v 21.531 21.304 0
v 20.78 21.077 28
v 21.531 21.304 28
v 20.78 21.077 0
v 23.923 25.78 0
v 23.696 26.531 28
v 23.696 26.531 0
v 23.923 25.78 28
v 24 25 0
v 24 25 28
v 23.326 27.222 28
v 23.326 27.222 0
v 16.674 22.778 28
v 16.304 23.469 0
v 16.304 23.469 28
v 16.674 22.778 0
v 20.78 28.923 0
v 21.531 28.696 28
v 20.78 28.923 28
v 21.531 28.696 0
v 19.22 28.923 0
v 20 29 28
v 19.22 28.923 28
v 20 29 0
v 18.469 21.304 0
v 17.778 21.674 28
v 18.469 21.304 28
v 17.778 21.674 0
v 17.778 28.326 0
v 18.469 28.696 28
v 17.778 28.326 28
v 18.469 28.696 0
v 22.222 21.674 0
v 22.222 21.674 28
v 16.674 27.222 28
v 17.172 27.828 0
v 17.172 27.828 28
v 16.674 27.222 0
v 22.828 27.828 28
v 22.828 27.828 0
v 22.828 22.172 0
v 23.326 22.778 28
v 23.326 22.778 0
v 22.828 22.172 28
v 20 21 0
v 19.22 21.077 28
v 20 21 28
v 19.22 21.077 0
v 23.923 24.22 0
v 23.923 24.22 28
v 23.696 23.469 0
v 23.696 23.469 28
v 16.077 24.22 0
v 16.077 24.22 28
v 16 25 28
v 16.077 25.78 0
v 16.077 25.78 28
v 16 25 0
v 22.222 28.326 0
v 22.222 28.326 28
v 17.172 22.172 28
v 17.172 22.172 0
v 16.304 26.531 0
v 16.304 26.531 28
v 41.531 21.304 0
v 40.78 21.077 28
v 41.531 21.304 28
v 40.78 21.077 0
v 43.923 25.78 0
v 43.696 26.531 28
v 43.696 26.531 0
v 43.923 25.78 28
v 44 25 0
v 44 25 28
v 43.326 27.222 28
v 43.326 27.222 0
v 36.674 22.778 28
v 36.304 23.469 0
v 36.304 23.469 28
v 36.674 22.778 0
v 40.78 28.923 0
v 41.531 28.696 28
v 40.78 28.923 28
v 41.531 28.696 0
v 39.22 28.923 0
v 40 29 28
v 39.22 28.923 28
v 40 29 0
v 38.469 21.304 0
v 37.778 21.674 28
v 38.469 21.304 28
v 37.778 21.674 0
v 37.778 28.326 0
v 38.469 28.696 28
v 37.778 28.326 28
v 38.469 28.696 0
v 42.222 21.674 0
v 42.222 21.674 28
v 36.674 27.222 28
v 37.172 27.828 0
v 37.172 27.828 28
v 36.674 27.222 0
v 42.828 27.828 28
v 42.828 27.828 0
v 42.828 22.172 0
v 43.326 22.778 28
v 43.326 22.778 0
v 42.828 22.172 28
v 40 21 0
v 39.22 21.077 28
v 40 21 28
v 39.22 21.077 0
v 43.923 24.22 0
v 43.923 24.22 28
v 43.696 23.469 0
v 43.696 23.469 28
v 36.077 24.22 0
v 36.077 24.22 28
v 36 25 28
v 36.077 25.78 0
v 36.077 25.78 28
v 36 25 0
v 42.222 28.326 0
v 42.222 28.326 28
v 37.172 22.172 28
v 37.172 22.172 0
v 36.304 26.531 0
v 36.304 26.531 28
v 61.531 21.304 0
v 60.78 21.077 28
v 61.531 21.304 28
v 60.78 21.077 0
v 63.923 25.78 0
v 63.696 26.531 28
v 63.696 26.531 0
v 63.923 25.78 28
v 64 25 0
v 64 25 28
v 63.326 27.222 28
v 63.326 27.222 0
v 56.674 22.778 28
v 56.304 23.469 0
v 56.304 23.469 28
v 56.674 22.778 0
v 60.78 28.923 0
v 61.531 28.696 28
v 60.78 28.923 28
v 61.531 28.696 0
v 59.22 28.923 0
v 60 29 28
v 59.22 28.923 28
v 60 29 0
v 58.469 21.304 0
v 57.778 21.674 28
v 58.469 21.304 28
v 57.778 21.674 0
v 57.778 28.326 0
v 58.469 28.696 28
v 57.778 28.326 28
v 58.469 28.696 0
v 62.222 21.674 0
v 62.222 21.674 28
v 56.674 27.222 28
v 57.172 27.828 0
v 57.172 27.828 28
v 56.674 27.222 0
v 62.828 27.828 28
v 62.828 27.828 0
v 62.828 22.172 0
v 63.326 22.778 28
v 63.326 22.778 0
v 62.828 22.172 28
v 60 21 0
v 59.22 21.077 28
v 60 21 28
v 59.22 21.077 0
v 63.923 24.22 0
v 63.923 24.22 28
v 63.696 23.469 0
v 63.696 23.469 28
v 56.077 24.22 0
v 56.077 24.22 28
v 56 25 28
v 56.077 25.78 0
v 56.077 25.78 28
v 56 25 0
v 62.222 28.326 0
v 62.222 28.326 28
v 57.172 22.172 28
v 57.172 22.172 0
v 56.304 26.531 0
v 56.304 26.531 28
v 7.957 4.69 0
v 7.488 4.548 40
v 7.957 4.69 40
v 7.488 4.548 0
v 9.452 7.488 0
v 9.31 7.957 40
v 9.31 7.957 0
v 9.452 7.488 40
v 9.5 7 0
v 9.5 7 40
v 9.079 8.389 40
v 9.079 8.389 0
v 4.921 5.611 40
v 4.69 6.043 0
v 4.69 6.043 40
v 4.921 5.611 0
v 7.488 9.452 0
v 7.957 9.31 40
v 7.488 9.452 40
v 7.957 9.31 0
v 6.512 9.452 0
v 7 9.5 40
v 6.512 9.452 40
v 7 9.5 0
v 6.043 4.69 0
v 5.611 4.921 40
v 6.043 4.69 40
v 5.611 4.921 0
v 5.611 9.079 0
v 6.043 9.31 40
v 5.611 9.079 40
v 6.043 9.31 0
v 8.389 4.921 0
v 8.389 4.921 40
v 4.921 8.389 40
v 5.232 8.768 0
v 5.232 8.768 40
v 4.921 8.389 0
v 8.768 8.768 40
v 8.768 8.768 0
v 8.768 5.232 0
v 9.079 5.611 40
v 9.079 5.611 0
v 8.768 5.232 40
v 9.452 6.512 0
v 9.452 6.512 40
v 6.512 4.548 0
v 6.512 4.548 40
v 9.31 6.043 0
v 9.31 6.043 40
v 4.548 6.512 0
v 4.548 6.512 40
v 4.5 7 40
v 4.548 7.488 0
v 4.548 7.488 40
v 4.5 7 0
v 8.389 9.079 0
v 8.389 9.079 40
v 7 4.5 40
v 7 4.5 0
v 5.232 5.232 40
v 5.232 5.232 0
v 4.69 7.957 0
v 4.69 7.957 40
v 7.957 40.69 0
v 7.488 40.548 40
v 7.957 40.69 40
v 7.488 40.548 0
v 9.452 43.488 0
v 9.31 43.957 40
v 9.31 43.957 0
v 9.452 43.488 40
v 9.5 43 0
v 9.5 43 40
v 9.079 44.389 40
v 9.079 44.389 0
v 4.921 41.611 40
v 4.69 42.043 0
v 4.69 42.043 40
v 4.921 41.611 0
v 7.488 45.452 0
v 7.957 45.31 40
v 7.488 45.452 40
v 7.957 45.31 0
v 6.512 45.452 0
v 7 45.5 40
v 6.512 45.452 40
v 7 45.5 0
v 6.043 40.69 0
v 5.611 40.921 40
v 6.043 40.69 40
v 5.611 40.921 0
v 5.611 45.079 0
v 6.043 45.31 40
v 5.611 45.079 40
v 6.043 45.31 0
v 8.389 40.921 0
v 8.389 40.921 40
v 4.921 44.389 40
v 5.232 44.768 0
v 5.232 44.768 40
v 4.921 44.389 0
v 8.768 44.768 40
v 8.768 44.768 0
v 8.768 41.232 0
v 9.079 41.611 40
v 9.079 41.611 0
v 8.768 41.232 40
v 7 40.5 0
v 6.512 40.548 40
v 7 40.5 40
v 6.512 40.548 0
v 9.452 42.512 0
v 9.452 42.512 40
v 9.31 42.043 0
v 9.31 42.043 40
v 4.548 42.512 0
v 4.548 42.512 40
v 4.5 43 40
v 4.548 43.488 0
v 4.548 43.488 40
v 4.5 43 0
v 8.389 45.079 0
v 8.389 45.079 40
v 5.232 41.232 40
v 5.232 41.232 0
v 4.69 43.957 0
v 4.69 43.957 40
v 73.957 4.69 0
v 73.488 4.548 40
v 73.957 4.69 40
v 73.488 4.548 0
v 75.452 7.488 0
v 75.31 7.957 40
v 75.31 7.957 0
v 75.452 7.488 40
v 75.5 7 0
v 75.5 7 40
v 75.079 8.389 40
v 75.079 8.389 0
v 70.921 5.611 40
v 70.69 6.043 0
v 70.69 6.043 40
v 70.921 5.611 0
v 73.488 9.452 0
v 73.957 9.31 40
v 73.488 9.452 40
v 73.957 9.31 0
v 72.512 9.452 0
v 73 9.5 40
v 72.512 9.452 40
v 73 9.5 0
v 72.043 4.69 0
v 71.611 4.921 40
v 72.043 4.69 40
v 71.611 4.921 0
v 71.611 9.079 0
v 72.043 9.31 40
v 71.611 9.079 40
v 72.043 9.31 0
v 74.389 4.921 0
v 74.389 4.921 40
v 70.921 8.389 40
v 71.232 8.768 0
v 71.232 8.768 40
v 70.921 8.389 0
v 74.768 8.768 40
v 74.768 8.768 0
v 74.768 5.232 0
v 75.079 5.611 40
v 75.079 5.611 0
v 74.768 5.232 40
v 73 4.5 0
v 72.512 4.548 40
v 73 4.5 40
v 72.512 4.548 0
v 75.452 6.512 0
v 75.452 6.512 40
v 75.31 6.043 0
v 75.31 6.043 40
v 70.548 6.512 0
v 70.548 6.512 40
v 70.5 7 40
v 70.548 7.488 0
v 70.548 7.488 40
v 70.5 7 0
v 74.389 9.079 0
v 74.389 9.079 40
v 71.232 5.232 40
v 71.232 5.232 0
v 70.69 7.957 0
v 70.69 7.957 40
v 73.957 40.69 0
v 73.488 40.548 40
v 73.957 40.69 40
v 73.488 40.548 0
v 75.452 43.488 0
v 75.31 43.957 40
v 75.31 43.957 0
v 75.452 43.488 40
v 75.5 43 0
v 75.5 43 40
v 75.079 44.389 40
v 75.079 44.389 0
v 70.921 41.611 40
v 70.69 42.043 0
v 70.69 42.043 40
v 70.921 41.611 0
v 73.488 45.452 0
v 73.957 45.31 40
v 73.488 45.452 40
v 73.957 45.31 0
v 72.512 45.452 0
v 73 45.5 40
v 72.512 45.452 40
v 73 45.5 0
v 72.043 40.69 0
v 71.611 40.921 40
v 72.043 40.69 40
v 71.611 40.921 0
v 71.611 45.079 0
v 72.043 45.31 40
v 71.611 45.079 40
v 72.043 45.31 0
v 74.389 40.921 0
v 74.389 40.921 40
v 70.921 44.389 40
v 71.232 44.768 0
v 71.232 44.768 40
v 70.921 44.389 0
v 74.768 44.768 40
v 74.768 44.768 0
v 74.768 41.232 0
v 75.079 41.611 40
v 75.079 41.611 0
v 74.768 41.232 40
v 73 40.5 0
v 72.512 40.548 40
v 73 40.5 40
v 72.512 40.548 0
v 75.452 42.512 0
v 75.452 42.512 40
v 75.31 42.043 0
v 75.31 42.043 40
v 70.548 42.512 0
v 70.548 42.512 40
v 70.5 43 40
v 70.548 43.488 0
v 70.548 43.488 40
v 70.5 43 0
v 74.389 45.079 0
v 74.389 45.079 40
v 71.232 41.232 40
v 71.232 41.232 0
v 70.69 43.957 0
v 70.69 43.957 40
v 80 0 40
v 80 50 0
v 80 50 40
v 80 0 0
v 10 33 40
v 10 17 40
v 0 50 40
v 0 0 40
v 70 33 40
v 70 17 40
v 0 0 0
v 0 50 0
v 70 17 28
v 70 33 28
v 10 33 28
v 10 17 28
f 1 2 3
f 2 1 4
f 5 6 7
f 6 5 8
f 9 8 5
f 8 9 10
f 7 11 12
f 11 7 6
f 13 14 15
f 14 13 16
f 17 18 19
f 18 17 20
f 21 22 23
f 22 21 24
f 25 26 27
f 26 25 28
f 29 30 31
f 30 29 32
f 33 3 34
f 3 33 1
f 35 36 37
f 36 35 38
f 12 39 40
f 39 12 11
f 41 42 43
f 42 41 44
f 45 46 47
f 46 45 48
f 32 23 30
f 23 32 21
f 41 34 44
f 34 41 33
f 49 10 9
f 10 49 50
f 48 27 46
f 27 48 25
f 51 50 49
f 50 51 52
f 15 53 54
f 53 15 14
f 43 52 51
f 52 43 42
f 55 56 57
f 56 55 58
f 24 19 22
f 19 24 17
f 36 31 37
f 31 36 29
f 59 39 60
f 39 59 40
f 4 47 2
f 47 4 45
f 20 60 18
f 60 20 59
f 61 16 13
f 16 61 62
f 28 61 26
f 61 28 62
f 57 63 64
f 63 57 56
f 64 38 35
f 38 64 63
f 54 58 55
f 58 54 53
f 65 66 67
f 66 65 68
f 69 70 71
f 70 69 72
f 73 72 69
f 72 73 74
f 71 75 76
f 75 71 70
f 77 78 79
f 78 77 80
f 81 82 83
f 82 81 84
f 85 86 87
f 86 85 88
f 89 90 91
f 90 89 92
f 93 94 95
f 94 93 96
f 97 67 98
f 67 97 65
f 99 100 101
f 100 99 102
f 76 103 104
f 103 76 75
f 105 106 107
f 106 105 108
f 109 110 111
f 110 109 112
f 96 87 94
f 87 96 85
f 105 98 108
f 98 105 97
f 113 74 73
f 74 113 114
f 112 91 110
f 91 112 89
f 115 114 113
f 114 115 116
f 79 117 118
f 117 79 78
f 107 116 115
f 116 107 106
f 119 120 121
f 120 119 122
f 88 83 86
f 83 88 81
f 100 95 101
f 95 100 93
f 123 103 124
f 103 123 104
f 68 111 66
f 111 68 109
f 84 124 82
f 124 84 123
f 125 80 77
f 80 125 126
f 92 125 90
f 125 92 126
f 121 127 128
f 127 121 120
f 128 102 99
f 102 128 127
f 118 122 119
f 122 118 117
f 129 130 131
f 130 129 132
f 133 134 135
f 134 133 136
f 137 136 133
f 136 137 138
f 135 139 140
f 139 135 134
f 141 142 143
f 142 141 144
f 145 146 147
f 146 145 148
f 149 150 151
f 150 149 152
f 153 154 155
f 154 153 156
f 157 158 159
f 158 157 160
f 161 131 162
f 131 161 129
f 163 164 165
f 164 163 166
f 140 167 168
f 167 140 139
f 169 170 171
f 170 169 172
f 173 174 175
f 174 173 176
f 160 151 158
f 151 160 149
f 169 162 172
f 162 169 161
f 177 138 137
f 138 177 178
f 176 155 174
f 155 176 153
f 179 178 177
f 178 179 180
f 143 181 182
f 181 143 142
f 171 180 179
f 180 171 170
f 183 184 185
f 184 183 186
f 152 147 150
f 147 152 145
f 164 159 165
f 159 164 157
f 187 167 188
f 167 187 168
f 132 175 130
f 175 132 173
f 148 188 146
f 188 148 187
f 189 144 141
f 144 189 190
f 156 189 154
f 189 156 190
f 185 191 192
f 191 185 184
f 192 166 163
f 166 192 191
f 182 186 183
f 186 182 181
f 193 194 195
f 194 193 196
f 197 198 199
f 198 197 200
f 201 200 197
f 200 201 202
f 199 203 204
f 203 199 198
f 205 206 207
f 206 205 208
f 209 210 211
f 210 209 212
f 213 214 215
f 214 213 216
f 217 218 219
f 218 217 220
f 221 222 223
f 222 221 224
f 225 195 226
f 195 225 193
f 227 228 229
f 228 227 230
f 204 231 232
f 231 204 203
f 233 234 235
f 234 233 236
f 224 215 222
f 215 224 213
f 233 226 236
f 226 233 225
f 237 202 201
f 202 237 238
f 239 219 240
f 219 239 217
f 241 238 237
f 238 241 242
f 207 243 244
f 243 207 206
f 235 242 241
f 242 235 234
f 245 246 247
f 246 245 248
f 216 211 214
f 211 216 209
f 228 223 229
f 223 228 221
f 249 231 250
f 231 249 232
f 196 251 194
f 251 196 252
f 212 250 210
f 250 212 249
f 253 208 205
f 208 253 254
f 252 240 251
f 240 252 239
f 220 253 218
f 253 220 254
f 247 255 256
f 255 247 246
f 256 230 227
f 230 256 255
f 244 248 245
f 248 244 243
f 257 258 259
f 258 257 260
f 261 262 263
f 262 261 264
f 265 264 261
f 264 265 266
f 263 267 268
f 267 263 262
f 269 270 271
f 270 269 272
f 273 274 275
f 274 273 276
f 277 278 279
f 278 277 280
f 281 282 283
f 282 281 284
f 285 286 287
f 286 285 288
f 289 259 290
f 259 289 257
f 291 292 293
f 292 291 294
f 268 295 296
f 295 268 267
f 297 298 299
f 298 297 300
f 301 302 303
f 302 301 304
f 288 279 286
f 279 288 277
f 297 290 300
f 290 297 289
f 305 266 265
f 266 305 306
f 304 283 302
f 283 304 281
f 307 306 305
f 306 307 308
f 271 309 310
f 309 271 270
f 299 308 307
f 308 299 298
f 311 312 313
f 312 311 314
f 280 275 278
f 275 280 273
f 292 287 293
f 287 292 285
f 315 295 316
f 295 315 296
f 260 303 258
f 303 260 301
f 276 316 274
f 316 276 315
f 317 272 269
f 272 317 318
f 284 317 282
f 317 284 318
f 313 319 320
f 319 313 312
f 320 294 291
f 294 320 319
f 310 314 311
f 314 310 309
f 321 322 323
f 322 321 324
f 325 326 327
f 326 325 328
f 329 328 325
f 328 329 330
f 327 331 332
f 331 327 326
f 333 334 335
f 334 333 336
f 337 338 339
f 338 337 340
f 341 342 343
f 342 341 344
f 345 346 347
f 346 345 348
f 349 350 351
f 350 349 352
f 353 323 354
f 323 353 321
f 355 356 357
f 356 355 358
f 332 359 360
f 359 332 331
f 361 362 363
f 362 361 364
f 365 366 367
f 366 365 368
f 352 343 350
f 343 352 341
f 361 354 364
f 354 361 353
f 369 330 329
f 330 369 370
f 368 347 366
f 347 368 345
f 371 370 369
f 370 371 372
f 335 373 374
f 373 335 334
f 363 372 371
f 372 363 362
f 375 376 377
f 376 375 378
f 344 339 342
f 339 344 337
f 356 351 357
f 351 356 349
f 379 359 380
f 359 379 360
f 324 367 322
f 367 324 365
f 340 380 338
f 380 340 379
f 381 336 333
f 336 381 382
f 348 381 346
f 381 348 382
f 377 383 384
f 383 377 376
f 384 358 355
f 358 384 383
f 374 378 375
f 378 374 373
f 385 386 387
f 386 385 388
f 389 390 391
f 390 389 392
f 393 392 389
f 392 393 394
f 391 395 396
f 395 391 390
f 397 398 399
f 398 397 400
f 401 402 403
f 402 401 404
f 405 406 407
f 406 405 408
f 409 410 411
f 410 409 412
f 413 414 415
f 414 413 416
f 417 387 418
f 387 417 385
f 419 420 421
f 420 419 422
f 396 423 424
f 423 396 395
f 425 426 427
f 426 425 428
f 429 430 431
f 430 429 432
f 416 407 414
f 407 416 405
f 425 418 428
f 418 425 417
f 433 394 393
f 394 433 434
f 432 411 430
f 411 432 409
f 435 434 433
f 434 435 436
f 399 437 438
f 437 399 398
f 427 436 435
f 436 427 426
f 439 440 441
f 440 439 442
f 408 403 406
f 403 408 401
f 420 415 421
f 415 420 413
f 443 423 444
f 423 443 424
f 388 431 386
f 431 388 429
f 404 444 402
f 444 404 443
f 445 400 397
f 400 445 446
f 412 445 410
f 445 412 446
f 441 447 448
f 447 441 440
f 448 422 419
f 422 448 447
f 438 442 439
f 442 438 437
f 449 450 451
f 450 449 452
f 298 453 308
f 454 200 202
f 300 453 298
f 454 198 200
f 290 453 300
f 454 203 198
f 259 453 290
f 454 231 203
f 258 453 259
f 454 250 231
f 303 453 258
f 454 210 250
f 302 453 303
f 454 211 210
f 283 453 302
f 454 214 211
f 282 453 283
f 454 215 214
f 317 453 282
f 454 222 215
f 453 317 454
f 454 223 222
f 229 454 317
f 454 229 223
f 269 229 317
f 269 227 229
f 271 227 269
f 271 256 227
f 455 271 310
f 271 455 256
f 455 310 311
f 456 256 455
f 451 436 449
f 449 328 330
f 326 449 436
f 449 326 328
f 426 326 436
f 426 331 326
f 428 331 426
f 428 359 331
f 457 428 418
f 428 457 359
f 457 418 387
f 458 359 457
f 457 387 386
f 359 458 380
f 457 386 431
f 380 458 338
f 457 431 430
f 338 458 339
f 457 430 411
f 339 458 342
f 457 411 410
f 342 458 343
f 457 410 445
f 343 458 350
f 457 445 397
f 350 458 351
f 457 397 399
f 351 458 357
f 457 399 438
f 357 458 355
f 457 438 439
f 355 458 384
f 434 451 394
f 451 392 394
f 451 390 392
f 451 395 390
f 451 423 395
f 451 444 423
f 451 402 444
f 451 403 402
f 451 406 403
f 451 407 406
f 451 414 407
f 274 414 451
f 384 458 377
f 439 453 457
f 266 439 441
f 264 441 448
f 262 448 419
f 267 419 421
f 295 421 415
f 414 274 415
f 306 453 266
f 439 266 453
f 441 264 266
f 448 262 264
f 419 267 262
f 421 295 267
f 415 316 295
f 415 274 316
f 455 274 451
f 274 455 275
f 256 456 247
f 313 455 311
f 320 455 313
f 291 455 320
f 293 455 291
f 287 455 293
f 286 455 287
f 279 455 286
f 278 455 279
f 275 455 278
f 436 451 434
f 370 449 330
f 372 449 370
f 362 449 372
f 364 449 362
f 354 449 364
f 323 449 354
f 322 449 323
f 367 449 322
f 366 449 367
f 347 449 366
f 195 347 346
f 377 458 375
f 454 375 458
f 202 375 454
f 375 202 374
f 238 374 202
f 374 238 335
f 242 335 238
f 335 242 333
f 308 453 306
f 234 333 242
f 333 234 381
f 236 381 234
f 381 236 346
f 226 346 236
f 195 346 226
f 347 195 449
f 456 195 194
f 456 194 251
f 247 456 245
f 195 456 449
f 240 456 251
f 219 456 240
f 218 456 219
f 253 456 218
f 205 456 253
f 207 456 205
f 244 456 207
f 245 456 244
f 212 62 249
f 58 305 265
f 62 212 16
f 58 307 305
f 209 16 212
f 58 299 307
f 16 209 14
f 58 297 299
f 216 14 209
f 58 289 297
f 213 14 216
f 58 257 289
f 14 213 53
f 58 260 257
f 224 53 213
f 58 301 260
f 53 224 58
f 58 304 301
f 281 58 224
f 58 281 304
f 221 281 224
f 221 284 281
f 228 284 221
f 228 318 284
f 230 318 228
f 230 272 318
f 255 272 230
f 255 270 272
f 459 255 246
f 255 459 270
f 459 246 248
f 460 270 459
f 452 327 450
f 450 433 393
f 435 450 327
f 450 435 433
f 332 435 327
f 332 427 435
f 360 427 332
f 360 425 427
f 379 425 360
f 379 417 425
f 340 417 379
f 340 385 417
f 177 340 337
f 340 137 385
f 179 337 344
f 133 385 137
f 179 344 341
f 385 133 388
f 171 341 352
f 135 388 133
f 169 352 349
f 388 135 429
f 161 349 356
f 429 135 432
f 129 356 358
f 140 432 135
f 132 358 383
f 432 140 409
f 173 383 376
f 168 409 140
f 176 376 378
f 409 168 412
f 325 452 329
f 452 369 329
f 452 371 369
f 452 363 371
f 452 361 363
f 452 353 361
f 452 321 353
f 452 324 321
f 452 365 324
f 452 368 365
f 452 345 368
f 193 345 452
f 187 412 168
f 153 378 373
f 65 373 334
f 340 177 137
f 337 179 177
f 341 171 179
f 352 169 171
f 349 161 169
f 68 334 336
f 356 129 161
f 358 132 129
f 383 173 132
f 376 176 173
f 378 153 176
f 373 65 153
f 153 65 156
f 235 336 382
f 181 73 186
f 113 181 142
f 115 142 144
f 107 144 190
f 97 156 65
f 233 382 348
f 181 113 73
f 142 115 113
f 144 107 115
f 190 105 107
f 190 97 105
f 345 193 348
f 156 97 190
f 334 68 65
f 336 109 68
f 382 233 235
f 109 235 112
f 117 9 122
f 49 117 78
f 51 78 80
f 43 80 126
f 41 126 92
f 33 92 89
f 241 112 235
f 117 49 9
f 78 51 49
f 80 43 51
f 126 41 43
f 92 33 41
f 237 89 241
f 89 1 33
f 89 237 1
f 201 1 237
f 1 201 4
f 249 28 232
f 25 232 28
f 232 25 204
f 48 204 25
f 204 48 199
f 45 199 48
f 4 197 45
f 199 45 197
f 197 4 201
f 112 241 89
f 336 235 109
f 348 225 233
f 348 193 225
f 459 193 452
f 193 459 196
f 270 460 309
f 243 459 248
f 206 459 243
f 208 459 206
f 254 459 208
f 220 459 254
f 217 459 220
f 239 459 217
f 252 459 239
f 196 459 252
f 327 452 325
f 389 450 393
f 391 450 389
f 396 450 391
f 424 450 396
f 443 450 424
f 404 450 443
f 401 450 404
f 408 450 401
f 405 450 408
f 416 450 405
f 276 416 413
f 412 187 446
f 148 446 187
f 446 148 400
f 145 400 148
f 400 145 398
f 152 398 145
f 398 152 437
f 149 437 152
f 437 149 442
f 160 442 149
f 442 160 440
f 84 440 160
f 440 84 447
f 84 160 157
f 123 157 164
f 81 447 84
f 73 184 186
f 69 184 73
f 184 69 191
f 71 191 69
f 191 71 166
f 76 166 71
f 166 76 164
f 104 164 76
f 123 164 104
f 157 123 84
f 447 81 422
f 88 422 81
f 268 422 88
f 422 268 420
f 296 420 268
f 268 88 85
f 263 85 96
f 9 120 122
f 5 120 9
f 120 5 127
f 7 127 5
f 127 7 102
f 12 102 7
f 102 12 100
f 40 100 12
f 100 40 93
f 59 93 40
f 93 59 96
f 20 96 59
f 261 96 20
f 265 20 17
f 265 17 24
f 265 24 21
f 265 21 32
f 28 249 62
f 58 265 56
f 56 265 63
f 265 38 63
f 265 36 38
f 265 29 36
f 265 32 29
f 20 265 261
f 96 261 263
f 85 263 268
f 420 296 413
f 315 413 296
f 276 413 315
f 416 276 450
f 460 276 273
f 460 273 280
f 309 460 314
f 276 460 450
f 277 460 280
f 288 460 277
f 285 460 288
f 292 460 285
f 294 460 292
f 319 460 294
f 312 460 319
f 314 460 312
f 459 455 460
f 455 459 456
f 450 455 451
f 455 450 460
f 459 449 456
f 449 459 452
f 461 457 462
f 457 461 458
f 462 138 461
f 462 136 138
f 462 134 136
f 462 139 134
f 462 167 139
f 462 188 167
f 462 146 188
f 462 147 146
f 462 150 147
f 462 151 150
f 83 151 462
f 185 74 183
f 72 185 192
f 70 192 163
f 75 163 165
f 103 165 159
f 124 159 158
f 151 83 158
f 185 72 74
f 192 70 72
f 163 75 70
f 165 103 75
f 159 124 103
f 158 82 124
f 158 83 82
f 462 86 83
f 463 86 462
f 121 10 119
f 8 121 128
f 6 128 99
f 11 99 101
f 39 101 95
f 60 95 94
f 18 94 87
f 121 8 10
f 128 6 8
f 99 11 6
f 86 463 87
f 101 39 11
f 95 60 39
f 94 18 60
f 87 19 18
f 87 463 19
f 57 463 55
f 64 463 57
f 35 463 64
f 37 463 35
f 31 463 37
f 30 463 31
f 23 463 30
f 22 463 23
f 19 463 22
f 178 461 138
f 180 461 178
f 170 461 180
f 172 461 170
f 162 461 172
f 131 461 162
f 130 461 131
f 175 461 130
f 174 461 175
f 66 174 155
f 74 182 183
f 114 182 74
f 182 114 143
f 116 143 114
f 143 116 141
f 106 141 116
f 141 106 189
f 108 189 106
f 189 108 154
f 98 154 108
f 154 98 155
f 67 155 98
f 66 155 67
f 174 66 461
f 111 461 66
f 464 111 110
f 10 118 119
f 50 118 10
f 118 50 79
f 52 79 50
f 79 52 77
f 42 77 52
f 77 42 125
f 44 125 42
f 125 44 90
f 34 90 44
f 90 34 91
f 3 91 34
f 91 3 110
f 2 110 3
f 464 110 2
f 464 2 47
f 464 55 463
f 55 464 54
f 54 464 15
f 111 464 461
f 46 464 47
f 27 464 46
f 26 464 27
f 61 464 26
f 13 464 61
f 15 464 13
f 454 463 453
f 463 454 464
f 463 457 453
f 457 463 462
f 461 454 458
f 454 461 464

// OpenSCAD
$fn = 32;

// ----------------------------------------------------------------------
// Manifold block: gallery_top manifold
// ----------------------------------------------------------------------

// --- parameters (mm) ---
block_l = 80;             // block length, X
block_w = 50;             // block width, Y
block_h = 40;             // block height, Z
port_d = 8;               // port bore diameter
port_pitch = 20;          // port pitch along X
gallery_d = 16;           // top gallery width, Y
gallery_depth = 12;       // gallery pocket depth
wall_p = 10;              // gallery end wall thickness, X
mnt_d = 5;                // mounting hole diameter
mnt_in = 7;               // mounting hole inset from the edges

n_ports = 3;  // ports in the row
port_x0 = (block_l - (n_ports - 1) * port_pitch) / 2;  // first port X

difference() {
  cube([block_l, block_w, block_h]);
  for (i = [0 : n_ports - 1])
    translate([port_x0 + i * port_pitch, block_w / 2, -1])
      cylinder(h = block_h + 2, d = port_d);
  translate([wall_p, block_w / 2 - gallery_d / 2, block_h - gallery_depth])
    cube([block_l - 2 * wall_p, gallery_d, gallery_depth + 1]);
  for (cx = [mnt_in, block_l - mnt_in])
    for (cy = [mnt_in, block_w - mnt_in])
      translate([cx, cy, -1]) cylinder(h = block_h + 2, d = mnt_d);
}
